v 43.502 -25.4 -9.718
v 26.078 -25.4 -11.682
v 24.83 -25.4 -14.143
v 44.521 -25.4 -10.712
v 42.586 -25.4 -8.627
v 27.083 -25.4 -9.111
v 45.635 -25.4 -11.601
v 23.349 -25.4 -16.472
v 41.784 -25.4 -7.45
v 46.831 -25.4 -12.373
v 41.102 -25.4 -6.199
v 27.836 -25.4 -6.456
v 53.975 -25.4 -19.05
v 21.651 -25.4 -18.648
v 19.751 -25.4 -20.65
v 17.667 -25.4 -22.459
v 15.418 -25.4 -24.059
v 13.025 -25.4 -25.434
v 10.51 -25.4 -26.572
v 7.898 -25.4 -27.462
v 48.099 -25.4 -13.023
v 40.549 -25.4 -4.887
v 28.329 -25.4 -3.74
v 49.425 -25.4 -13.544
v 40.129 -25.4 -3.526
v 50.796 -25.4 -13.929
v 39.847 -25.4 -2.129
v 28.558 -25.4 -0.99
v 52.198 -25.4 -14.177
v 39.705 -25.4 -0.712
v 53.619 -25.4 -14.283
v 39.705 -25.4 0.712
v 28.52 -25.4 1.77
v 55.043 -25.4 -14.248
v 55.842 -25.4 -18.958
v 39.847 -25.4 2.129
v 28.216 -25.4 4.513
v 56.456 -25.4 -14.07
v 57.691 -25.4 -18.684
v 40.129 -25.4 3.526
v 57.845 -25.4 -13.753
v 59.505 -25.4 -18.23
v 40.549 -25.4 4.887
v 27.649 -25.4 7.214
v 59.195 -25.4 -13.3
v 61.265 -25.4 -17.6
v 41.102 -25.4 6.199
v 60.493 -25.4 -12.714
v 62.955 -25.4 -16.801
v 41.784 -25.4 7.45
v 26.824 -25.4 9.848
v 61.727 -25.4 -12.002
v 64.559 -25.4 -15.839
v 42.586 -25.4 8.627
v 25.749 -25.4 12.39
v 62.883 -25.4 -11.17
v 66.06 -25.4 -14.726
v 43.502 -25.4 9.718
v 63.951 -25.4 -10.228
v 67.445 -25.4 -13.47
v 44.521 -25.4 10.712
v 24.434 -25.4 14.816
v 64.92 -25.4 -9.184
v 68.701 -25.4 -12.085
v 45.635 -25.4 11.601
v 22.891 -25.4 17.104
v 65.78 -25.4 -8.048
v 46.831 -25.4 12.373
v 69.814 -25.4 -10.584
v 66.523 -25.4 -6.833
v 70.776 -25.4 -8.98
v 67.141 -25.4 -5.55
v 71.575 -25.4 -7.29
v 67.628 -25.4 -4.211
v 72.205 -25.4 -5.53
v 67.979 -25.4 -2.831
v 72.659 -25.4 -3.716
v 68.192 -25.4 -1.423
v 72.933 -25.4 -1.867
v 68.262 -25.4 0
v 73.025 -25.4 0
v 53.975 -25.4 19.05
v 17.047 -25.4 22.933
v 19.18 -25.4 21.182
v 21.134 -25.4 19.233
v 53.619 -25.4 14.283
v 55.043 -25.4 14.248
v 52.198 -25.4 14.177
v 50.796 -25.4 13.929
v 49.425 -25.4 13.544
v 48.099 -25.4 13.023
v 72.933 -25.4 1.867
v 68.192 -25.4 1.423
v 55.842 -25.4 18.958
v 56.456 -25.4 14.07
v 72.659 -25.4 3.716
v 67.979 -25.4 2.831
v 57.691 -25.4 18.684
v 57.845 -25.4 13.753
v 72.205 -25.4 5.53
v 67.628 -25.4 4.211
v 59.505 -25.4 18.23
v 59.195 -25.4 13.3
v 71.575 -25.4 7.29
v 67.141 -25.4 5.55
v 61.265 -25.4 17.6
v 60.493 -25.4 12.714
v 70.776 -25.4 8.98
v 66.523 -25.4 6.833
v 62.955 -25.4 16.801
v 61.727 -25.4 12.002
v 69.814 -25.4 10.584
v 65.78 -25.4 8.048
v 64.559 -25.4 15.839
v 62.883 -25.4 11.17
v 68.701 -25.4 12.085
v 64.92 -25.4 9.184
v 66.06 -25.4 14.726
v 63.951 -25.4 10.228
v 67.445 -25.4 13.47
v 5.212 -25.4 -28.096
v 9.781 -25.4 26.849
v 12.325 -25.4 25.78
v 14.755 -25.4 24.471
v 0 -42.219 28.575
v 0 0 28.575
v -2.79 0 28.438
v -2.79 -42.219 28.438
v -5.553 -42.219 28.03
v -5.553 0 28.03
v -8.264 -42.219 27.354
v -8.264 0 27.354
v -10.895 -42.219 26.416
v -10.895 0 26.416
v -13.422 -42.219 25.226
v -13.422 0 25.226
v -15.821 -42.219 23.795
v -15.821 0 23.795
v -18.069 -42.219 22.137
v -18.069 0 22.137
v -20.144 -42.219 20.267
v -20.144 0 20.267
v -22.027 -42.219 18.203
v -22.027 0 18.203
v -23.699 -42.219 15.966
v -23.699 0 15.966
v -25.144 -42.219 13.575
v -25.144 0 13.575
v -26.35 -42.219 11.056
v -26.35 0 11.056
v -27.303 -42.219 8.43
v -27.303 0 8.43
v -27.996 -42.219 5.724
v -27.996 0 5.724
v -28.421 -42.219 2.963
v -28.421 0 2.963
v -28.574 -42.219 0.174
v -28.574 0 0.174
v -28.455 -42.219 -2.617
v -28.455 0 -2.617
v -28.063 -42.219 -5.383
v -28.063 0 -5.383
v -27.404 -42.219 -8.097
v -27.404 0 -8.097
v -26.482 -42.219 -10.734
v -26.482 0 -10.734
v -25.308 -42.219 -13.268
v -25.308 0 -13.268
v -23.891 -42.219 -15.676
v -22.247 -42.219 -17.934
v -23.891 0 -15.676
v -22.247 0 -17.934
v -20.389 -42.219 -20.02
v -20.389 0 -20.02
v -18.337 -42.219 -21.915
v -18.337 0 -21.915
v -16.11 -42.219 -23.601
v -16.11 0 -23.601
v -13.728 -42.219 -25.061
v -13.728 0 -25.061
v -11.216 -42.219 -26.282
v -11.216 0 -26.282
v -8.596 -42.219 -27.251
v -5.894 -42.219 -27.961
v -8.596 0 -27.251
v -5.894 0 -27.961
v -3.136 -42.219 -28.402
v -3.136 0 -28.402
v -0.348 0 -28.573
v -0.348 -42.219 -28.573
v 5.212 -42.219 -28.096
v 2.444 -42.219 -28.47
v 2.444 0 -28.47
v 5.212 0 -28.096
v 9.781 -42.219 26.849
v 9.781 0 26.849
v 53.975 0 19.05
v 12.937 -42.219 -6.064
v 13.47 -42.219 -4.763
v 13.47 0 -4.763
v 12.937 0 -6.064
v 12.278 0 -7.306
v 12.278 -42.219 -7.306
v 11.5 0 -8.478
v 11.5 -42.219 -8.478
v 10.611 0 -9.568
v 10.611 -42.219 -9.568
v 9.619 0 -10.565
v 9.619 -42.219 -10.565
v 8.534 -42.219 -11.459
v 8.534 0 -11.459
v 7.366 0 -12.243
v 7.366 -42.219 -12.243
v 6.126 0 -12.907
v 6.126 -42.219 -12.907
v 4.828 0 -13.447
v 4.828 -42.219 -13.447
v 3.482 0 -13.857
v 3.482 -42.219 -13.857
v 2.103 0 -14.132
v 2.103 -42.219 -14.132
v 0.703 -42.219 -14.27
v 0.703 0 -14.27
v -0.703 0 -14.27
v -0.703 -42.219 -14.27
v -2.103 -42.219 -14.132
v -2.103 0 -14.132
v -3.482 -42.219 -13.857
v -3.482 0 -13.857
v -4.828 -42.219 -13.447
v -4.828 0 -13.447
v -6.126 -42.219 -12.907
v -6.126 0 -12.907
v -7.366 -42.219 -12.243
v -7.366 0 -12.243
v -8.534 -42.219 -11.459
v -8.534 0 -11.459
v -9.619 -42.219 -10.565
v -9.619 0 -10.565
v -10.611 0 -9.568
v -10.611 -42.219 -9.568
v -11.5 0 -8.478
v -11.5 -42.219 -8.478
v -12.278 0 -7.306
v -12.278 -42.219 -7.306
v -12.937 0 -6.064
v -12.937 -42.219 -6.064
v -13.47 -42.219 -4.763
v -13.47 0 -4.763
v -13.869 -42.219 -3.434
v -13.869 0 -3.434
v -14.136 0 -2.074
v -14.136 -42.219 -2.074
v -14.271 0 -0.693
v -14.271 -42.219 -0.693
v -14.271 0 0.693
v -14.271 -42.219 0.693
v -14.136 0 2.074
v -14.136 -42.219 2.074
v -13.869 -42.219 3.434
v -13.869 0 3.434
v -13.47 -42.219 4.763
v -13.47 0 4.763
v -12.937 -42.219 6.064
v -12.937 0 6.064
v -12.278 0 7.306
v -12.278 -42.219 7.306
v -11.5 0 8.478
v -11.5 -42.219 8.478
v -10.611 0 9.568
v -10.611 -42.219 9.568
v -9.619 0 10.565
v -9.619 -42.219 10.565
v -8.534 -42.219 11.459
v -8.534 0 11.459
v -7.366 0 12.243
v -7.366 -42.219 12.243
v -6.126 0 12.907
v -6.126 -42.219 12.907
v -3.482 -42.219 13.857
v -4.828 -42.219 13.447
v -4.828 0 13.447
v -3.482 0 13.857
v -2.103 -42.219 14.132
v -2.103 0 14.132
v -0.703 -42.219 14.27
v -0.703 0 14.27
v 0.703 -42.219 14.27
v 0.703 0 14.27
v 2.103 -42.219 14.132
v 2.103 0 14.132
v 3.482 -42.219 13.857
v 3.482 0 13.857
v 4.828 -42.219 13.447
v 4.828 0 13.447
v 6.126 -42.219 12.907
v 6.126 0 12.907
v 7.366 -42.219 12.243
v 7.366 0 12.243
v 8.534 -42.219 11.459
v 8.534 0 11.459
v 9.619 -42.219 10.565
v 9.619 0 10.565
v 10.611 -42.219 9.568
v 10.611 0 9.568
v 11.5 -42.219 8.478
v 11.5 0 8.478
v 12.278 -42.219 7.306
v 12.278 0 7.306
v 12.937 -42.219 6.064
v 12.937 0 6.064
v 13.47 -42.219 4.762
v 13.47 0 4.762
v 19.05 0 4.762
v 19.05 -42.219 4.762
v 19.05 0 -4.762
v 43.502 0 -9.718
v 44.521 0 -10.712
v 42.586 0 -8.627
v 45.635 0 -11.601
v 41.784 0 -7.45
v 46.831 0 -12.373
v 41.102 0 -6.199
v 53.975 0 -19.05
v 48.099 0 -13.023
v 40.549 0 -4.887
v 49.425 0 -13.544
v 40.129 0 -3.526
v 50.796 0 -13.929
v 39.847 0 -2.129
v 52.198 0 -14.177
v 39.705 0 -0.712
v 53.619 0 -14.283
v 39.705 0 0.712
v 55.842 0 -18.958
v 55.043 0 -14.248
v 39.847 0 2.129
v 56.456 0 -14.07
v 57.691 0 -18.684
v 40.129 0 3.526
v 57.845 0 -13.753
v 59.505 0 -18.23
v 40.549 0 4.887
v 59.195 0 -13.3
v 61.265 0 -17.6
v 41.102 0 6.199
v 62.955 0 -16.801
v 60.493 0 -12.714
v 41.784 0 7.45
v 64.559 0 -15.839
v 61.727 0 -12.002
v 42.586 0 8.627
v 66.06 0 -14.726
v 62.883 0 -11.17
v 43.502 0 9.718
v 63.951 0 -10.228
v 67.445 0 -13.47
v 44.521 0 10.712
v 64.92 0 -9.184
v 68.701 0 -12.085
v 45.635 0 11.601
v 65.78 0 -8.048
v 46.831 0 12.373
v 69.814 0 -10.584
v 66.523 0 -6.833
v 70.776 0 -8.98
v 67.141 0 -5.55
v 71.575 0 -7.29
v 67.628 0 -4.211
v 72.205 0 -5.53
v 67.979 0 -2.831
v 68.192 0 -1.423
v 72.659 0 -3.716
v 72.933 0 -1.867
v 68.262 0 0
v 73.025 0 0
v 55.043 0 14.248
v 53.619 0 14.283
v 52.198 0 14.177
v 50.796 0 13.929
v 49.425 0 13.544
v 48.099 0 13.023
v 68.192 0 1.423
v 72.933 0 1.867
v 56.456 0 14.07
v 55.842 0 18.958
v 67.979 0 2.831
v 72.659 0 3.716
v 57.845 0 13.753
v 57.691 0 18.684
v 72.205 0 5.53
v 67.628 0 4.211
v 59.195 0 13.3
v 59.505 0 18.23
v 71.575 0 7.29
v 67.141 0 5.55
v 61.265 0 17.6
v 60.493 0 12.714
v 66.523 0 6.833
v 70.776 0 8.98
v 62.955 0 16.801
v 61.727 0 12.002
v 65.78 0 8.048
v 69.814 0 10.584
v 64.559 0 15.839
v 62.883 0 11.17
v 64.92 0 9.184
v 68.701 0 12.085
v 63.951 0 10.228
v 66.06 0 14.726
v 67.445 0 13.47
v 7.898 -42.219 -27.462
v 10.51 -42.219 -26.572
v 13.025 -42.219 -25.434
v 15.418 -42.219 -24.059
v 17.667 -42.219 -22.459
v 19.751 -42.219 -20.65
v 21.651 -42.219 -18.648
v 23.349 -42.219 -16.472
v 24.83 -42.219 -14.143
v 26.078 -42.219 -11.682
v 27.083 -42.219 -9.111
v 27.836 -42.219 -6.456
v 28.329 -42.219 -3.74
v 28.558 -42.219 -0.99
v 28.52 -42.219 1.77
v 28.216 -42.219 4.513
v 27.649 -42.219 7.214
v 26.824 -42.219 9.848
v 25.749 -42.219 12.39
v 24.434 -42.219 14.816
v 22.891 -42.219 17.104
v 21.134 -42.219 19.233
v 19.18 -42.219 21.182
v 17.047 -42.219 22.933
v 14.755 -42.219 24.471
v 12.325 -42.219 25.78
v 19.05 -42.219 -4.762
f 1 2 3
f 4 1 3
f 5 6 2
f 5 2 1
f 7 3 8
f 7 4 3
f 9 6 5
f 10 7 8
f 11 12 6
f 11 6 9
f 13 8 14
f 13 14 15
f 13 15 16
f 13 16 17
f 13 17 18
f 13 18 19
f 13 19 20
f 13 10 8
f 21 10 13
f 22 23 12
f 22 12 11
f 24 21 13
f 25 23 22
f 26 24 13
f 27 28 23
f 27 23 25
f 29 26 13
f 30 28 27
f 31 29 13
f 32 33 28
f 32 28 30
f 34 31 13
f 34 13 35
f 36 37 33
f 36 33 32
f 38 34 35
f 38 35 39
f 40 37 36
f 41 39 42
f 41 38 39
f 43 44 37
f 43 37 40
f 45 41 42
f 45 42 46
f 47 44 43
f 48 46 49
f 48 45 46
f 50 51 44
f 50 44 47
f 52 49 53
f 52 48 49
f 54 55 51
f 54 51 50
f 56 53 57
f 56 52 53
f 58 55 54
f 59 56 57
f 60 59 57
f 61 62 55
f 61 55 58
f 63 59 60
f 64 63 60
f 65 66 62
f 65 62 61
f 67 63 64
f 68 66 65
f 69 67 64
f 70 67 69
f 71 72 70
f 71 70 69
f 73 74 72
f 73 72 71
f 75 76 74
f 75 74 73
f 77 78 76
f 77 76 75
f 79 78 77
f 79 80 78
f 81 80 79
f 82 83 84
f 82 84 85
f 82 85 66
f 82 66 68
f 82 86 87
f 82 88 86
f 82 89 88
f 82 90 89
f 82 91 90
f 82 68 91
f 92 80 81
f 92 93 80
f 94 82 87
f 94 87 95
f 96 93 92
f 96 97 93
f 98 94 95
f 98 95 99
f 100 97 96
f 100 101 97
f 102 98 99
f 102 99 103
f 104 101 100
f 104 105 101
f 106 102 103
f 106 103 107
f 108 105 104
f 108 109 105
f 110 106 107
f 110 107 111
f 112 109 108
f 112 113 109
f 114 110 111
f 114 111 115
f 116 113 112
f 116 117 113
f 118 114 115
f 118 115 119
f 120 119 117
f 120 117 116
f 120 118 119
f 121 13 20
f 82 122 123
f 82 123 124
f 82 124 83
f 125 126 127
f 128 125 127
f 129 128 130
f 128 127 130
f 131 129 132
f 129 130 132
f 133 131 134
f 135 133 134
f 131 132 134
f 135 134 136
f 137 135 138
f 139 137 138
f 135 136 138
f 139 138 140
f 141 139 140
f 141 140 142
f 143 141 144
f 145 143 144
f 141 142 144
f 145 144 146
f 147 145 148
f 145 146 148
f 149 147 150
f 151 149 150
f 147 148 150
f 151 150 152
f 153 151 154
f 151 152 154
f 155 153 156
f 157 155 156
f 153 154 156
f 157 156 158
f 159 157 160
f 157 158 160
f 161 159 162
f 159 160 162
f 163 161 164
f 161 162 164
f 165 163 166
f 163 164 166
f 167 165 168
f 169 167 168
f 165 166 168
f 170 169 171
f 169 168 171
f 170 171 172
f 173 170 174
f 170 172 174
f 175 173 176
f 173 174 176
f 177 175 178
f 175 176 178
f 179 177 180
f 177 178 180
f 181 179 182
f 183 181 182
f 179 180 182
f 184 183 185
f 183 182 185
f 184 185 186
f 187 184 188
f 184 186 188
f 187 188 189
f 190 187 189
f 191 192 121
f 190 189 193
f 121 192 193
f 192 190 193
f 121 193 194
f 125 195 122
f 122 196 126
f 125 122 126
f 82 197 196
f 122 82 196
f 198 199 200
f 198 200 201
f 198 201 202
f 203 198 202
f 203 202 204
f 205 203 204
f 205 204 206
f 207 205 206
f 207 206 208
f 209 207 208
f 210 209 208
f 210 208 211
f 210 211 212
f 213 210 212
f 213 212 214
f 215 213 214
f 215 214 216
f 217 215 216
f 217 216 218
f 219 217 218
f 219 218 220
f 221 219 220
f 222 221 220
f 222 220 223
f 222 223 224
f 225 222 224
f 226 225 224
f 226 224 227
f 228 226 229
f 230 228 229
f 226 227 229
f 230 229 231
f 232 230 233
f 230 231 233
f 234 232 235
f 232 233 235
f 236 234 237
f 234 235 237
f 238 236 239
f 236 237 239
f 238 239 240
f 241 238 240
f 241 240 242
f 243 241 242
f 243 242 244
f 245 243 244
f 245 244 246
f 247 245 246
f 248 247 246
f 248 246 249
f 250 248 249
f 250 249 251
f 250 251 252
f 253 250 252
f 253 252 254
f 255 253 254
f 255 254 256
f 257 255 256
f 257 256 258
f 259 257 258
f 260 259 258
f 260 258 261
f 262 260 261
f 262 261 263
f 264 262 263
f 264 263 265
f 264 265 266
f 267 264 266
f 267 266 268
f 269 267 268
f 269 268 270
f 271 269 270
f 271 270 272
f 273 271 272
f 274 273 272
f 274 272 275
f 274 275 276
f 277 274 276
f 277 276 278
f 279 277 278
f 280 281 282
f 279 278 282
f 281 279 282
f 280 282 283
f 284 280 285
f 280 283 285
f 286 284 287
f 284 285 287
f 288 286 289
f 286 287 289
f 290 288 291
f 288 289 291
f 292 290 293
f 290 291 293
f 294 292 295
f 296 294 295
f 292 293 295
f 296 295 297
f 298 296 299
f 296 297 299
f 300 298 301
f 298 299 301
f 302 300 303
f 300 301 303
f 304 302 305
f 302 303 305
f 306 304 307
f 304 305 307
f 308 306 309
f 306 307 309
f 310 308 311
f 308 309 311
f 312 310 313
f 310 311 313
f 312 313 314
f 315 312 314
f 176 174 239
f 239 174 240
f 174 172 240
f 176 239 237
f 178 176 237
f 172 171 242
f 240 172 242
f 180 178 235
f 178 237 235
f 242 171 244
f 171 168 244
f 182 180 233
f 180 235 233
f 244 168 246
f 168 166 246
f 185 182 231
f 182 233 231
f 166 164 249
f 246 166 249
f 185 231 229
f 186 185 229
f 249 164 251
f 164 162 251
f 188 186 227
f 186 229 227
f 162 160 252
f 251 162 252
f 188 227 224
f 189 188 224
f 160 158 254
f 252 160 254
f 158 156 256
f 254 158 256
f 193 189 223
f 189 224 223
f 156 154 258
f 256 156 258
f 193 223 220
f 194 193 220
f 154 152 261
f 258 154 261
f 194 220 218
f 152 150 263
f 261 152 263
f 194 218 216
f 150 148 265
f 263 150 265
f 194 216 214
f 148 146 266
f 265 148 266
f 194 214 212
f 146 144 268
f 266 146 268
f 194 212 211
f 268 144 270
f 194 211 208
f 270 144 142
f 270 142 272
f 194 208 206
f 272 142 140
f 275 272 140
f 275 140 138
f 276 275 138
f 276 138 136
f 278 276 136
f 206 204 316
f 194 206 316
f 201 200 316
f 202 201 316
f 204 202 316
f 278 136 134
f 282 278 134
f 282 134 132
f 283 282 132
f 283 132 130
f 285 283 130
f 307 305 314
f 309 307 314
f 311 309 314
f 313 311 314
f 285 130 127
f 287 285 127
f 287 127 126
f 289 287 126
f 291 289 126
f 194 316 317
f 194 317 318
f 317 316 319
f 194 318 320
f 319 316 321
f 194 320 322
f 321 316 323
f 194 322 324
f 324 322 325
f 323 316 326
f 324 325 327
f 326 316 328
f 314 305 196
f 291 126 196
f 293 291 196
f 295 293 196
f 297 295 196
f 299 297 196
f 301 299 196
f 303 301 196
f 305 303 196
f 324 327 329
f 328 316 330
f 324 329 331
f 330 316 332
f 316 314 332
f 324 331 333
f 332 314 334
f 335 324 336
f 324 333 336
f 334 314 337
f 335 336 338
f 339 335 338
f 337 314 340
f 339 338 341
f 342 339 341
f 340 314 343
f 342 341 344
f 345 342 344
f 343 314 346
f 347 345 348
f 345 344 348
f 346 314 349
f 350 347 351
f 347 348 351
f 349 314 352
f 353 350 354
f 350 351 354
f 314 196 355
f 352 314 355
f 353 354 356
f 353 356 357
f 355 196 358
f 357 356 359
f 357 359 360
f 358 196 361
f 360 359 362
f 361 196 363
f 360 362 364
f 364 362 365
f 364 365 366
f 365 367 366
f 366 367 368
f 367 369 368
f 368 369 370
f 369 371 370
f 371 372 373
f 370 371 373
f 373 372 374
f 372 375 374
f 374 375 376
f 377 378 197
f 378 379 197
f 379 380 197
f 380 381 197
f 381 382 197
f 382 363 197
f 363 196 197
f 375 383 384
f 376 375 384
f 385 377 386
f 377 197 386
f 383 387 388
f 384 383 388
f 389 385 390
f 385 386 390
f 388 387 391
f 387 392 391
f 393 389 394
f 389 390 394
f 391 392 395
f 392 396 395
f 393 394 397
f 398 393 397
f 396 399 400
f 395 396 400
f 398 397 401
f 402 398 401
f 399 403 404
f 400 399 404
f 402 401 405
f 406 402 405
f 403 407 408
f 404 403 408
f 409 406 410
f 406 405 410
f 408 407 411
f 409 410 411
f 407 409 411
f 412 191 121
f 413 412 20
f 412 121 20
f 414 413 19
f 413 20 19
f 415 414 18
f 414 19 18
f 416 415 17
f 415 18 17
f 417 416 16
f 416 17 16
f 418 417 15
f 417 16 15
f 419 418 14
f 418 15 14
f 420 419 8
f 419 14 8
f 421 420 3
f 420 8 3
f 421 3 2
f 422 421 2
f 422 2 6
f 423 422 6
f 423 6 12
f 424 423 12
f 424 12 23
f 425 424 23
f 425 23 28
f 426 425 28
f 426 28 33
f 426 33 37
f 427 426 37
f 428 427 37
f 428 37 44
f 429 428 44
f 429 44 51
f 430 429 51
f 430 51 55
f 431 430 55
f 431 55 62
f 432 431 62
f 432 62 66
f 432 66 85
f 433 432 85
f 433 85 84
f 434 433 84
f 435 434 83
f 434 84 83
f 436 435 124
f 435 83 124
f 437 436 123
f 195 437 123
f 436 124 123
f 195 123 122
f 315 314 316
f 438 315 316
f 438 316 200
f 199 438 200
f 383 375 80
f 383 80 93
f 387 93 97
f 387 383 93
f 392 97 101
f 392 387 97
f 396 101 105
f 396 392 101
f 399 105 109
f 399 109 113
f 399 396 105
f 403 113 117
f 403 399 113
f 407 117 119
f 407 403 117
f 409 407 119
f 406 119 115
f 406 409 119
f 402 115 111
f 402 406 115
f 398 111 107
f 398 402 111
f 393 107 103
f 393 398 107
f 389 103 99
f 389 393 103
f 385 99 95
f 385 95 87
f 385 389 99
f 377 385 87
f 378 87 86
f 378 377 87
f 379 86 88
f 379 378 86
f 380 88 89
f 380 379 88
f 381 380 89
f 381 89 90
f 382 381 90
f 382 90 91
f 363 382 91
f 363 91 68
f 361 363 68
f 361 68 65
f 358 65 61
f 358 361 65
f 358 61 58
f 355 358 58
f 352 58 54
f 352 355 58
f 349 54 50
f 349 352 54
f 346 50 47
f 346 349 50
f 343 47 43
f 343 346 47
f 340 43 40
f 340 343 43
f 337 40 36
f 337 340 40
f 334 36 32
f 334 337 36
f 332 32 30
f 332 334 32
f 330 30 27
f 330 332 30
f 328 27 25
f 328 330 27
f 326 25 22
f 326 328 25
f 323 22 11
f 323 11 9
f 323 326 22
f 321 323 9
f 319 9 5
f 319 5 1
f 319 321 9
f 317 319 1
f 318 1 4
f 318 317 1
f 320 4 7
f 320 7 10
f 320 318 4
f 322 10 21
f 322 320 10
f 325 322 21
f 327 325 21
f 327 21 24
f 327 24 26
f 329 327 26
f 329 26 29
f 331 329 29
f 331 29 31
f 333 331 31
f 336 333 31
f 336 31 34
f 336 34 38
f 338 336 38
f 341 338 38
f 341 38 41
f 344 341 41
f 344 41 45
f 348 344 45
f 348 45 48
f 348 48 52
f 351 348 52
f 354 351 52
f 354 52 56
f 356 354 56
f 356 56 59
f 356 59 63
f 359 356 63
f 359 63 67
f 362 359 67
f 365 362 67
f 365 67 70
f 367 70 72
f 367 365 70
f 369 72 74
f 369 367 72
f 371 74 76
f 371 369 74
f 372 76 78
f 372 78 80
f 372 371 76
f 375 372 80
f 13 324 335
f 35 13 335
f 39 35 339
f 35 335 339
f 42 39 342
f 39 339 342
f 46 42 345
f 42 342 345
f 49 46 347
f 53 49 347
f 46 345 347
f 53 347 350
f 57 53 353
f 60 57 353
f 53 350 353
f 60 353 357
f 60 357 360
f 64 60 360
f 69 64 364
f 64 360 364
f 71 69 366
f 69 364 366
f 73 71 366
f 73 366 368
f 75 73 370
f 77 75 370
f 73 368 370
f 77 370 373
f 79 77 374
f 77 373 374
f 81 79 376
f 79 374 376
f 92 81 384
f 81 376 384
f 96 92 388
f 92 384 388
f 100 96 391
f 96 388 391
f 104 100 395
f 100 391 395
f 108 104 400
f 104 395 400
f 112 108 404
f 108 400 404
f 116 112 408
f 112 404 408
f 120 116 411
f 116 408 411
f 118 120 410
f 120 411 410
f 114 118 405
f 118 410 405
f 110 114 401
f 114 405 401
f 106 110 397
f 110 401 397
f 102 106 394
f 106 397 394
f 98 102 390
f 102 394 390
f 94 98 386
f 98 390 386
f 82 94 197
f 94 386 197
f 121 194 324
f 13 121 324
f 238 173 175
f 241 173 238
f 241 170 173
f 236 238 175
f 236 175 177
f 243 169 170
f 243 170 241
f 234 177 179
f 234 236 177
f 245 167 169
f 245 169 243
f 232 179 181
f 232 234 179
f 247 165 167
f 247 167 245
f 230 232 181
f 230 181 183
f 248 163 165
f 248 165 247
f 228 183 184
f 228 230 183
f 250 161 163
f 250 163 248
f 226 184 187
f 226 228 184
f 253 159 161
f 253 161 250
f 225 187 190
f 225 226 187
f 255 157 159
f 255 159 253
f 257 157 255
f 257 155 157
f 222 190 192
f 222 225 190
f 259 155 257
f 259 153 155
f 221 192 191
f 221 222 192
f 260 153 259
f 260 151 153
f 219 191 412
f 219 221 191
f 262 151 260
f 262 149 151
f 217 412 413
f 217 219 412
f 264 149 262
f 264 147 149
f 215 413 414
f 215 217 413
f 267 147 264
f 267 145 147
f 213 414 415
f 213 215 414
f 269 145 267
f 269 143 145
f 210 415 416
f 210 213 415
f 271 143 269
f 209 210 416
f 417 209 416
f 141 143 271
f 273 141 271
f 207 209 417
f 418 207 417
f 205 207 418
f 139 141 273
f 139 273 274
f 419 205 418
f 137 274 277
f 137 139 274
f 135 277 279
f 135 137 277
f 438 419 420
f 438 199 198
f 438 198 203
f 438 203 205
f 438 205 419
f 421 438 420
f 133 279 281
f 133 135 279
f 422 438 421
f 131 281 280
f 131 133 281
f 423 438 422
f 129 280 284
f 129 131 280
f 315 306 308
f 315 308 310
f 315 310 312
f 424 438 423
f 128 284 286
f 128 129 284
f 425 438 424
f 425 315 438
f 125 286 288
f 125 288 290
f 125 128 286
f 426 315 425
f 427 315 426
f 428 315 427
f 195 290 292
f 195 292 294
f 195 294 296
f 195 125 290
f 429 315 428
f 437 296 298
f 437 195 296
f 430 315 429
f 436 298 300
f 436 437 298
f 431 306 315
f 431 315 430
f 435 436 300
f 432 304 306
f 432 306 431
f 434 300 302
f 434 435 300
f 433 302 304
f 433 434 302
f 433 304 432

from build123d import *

# Parameters (mm, degrees)
F0_R     = 14.2875
F1_DEPTH = 25.4
F2_DEPTH = 42.21934


with BuildPart() as f1:
    # F0 (on Front) → F1 (new body)
    with BuildSketch(Plane.XZ):
        with BuildLine():
            ThreePointArc((5.2118166453, -28.0956863638), (21.9710978975, -18.2702348693), (28.575, 0))
            ThreePointArc((28.575, 0), (23.4095521288, 16.3866864902), (9.780704698, 26.8489932886))
            Line((9.780704698, 26.8489932886), (0, 28.575))
            ThreePointArc((0, 28.575), (-28.4549192834, -2.6169053435), (5.2118166453, -28.0956863638))
        make_face()
        with BuildLine():
            ThreePointArc((-13.4703841816, 4.7625), (0, 14.2875), (13.4703841816, 4.7625))
            Line((13.4703841816, 4.7625), (19.05, 4.7625))
            Line((19.05, 4.7625), (19.05, -4.7625))
            Line((19.05, -4.7625), (13.4703841816, -4.7625))
            ThreePointArc((13.4703841816, -4.7625), (0, -14.2875), (-13.4703841816, -4.7625))
            Line((-13.4703841816, -4.7625), (-19.05, -4.7625))
            Line((-19.05, -4.7625), (-19.05, 4.7625))
            Line((-19.05, 4.7625), (-13.4703841816, 4.7625))
        make_face(mode=Mode.SUBTRACT)
        with BuildLine():
            ThreePointArc((9.780704698, 26.8489932886), (23.4095521288, 16.3866864902), (28.575, 0))
            ThreePointArc((28.575, 0), (21.9710978975, -18.2702348693), (5.2118166453, -28.0956863638))
            Line((5.2118166453, -28.0956863638), (53.975, -19.05))
            ThreePointArc((53.975, -19.05), (34.925, 0), (53.975, 19.05))
            Line((53.975, 19.05), (9.780704698, 26.8489932886))
        make_face()
        with BuildLine():
            ThreePointArc((73.025, 0), (67.4453841816, 13.4703841816), (53.975, 19.05))
            ThreePointArc((53.975, 19.05), (34.925, 0), (53.975, -19.05))
            ThreePointArc((53.975, -19.05), (67.4453841816, -13.4703841816), (73.025, 0))
        make_face()
        with Locations((53.975, 0)):
            Circle(F0_R, mode=Mode.SUBTRACT)
        with BuildLine():
            ThreePointArc((-13.4703841816, -4.7625), (-14.2875, 0), (-13.4703841816, 4.7625))
            Line((-13.4703841816, 4.7625), (-19.05, 4.7625))
            Line((-19.05, 4.7625), (-19.05, -4.7625))
            Line((-19.05, -4.7625), (-13.4703841816, -4.7625))
        make_face()
    extrude(amount=F1_DEPTH)

    # F0 (on Front) → F2 (join)
    with BuildSketch(Plane.XZ):
        with BuildLine():
            ThreePointArc((5.2118166453, -28.0956863638), (21.9710978975, -18.2702348693), (28.575, 0))
            ThreePointArc((28.575, 0), (23.4095521288, 16.3866864902), (9.780704698, 26.8489932886))
            Line((9.780704698, 26.8489932886), (0, 28.575))
            ThreePointArc((0, 28.575), (-28.4549192834, -2.6169053435), (5.2118166453, -28.0956863638))
        make_face()
        with BuildLine():
            ThreePointArc((-13.4703841816, 4.7625), (0, 14.2875), (13.4703841816, 4.7625))
            Line((13.4703841816, 4.7625), (19.05, 4.7625))
            Line((19.05, 4.7625), (19.05, -4.7625))
            Line((19.05, -4.7625), (13.4703841816, -4.7625))
            ThreePointArc((13.4703841816, -4.7625), (0, -14.2875), (-13.4703841816, -4.7625))
            Line((-13.4703841816, -4.7625), (-19.05, -4.7625))
            Line((-19.05, -4.7625), (-19.05, 4.7625))
            Line((-19.05, 4.7625), (-13.4703841816, 4.7625))
        make_face(mode=Mode.SUBTRACT)
        with BuildLine():
            ThreePointArc((-13.4703841816, -4.7625), (-14.2875, 0), (-13.4703841816, 4.7625))
            Line((-13.4703841816, 4.7625), (-19.05, 4.7625))
            Line((-19.05, 4.7625), (-19.05, -4.7625))
            Line((-19.05, -4.7625), (-13.4703841816, -4.7625))
        make_face()
    extrude(amount=F2_DEPTH)


solid = f1.part
